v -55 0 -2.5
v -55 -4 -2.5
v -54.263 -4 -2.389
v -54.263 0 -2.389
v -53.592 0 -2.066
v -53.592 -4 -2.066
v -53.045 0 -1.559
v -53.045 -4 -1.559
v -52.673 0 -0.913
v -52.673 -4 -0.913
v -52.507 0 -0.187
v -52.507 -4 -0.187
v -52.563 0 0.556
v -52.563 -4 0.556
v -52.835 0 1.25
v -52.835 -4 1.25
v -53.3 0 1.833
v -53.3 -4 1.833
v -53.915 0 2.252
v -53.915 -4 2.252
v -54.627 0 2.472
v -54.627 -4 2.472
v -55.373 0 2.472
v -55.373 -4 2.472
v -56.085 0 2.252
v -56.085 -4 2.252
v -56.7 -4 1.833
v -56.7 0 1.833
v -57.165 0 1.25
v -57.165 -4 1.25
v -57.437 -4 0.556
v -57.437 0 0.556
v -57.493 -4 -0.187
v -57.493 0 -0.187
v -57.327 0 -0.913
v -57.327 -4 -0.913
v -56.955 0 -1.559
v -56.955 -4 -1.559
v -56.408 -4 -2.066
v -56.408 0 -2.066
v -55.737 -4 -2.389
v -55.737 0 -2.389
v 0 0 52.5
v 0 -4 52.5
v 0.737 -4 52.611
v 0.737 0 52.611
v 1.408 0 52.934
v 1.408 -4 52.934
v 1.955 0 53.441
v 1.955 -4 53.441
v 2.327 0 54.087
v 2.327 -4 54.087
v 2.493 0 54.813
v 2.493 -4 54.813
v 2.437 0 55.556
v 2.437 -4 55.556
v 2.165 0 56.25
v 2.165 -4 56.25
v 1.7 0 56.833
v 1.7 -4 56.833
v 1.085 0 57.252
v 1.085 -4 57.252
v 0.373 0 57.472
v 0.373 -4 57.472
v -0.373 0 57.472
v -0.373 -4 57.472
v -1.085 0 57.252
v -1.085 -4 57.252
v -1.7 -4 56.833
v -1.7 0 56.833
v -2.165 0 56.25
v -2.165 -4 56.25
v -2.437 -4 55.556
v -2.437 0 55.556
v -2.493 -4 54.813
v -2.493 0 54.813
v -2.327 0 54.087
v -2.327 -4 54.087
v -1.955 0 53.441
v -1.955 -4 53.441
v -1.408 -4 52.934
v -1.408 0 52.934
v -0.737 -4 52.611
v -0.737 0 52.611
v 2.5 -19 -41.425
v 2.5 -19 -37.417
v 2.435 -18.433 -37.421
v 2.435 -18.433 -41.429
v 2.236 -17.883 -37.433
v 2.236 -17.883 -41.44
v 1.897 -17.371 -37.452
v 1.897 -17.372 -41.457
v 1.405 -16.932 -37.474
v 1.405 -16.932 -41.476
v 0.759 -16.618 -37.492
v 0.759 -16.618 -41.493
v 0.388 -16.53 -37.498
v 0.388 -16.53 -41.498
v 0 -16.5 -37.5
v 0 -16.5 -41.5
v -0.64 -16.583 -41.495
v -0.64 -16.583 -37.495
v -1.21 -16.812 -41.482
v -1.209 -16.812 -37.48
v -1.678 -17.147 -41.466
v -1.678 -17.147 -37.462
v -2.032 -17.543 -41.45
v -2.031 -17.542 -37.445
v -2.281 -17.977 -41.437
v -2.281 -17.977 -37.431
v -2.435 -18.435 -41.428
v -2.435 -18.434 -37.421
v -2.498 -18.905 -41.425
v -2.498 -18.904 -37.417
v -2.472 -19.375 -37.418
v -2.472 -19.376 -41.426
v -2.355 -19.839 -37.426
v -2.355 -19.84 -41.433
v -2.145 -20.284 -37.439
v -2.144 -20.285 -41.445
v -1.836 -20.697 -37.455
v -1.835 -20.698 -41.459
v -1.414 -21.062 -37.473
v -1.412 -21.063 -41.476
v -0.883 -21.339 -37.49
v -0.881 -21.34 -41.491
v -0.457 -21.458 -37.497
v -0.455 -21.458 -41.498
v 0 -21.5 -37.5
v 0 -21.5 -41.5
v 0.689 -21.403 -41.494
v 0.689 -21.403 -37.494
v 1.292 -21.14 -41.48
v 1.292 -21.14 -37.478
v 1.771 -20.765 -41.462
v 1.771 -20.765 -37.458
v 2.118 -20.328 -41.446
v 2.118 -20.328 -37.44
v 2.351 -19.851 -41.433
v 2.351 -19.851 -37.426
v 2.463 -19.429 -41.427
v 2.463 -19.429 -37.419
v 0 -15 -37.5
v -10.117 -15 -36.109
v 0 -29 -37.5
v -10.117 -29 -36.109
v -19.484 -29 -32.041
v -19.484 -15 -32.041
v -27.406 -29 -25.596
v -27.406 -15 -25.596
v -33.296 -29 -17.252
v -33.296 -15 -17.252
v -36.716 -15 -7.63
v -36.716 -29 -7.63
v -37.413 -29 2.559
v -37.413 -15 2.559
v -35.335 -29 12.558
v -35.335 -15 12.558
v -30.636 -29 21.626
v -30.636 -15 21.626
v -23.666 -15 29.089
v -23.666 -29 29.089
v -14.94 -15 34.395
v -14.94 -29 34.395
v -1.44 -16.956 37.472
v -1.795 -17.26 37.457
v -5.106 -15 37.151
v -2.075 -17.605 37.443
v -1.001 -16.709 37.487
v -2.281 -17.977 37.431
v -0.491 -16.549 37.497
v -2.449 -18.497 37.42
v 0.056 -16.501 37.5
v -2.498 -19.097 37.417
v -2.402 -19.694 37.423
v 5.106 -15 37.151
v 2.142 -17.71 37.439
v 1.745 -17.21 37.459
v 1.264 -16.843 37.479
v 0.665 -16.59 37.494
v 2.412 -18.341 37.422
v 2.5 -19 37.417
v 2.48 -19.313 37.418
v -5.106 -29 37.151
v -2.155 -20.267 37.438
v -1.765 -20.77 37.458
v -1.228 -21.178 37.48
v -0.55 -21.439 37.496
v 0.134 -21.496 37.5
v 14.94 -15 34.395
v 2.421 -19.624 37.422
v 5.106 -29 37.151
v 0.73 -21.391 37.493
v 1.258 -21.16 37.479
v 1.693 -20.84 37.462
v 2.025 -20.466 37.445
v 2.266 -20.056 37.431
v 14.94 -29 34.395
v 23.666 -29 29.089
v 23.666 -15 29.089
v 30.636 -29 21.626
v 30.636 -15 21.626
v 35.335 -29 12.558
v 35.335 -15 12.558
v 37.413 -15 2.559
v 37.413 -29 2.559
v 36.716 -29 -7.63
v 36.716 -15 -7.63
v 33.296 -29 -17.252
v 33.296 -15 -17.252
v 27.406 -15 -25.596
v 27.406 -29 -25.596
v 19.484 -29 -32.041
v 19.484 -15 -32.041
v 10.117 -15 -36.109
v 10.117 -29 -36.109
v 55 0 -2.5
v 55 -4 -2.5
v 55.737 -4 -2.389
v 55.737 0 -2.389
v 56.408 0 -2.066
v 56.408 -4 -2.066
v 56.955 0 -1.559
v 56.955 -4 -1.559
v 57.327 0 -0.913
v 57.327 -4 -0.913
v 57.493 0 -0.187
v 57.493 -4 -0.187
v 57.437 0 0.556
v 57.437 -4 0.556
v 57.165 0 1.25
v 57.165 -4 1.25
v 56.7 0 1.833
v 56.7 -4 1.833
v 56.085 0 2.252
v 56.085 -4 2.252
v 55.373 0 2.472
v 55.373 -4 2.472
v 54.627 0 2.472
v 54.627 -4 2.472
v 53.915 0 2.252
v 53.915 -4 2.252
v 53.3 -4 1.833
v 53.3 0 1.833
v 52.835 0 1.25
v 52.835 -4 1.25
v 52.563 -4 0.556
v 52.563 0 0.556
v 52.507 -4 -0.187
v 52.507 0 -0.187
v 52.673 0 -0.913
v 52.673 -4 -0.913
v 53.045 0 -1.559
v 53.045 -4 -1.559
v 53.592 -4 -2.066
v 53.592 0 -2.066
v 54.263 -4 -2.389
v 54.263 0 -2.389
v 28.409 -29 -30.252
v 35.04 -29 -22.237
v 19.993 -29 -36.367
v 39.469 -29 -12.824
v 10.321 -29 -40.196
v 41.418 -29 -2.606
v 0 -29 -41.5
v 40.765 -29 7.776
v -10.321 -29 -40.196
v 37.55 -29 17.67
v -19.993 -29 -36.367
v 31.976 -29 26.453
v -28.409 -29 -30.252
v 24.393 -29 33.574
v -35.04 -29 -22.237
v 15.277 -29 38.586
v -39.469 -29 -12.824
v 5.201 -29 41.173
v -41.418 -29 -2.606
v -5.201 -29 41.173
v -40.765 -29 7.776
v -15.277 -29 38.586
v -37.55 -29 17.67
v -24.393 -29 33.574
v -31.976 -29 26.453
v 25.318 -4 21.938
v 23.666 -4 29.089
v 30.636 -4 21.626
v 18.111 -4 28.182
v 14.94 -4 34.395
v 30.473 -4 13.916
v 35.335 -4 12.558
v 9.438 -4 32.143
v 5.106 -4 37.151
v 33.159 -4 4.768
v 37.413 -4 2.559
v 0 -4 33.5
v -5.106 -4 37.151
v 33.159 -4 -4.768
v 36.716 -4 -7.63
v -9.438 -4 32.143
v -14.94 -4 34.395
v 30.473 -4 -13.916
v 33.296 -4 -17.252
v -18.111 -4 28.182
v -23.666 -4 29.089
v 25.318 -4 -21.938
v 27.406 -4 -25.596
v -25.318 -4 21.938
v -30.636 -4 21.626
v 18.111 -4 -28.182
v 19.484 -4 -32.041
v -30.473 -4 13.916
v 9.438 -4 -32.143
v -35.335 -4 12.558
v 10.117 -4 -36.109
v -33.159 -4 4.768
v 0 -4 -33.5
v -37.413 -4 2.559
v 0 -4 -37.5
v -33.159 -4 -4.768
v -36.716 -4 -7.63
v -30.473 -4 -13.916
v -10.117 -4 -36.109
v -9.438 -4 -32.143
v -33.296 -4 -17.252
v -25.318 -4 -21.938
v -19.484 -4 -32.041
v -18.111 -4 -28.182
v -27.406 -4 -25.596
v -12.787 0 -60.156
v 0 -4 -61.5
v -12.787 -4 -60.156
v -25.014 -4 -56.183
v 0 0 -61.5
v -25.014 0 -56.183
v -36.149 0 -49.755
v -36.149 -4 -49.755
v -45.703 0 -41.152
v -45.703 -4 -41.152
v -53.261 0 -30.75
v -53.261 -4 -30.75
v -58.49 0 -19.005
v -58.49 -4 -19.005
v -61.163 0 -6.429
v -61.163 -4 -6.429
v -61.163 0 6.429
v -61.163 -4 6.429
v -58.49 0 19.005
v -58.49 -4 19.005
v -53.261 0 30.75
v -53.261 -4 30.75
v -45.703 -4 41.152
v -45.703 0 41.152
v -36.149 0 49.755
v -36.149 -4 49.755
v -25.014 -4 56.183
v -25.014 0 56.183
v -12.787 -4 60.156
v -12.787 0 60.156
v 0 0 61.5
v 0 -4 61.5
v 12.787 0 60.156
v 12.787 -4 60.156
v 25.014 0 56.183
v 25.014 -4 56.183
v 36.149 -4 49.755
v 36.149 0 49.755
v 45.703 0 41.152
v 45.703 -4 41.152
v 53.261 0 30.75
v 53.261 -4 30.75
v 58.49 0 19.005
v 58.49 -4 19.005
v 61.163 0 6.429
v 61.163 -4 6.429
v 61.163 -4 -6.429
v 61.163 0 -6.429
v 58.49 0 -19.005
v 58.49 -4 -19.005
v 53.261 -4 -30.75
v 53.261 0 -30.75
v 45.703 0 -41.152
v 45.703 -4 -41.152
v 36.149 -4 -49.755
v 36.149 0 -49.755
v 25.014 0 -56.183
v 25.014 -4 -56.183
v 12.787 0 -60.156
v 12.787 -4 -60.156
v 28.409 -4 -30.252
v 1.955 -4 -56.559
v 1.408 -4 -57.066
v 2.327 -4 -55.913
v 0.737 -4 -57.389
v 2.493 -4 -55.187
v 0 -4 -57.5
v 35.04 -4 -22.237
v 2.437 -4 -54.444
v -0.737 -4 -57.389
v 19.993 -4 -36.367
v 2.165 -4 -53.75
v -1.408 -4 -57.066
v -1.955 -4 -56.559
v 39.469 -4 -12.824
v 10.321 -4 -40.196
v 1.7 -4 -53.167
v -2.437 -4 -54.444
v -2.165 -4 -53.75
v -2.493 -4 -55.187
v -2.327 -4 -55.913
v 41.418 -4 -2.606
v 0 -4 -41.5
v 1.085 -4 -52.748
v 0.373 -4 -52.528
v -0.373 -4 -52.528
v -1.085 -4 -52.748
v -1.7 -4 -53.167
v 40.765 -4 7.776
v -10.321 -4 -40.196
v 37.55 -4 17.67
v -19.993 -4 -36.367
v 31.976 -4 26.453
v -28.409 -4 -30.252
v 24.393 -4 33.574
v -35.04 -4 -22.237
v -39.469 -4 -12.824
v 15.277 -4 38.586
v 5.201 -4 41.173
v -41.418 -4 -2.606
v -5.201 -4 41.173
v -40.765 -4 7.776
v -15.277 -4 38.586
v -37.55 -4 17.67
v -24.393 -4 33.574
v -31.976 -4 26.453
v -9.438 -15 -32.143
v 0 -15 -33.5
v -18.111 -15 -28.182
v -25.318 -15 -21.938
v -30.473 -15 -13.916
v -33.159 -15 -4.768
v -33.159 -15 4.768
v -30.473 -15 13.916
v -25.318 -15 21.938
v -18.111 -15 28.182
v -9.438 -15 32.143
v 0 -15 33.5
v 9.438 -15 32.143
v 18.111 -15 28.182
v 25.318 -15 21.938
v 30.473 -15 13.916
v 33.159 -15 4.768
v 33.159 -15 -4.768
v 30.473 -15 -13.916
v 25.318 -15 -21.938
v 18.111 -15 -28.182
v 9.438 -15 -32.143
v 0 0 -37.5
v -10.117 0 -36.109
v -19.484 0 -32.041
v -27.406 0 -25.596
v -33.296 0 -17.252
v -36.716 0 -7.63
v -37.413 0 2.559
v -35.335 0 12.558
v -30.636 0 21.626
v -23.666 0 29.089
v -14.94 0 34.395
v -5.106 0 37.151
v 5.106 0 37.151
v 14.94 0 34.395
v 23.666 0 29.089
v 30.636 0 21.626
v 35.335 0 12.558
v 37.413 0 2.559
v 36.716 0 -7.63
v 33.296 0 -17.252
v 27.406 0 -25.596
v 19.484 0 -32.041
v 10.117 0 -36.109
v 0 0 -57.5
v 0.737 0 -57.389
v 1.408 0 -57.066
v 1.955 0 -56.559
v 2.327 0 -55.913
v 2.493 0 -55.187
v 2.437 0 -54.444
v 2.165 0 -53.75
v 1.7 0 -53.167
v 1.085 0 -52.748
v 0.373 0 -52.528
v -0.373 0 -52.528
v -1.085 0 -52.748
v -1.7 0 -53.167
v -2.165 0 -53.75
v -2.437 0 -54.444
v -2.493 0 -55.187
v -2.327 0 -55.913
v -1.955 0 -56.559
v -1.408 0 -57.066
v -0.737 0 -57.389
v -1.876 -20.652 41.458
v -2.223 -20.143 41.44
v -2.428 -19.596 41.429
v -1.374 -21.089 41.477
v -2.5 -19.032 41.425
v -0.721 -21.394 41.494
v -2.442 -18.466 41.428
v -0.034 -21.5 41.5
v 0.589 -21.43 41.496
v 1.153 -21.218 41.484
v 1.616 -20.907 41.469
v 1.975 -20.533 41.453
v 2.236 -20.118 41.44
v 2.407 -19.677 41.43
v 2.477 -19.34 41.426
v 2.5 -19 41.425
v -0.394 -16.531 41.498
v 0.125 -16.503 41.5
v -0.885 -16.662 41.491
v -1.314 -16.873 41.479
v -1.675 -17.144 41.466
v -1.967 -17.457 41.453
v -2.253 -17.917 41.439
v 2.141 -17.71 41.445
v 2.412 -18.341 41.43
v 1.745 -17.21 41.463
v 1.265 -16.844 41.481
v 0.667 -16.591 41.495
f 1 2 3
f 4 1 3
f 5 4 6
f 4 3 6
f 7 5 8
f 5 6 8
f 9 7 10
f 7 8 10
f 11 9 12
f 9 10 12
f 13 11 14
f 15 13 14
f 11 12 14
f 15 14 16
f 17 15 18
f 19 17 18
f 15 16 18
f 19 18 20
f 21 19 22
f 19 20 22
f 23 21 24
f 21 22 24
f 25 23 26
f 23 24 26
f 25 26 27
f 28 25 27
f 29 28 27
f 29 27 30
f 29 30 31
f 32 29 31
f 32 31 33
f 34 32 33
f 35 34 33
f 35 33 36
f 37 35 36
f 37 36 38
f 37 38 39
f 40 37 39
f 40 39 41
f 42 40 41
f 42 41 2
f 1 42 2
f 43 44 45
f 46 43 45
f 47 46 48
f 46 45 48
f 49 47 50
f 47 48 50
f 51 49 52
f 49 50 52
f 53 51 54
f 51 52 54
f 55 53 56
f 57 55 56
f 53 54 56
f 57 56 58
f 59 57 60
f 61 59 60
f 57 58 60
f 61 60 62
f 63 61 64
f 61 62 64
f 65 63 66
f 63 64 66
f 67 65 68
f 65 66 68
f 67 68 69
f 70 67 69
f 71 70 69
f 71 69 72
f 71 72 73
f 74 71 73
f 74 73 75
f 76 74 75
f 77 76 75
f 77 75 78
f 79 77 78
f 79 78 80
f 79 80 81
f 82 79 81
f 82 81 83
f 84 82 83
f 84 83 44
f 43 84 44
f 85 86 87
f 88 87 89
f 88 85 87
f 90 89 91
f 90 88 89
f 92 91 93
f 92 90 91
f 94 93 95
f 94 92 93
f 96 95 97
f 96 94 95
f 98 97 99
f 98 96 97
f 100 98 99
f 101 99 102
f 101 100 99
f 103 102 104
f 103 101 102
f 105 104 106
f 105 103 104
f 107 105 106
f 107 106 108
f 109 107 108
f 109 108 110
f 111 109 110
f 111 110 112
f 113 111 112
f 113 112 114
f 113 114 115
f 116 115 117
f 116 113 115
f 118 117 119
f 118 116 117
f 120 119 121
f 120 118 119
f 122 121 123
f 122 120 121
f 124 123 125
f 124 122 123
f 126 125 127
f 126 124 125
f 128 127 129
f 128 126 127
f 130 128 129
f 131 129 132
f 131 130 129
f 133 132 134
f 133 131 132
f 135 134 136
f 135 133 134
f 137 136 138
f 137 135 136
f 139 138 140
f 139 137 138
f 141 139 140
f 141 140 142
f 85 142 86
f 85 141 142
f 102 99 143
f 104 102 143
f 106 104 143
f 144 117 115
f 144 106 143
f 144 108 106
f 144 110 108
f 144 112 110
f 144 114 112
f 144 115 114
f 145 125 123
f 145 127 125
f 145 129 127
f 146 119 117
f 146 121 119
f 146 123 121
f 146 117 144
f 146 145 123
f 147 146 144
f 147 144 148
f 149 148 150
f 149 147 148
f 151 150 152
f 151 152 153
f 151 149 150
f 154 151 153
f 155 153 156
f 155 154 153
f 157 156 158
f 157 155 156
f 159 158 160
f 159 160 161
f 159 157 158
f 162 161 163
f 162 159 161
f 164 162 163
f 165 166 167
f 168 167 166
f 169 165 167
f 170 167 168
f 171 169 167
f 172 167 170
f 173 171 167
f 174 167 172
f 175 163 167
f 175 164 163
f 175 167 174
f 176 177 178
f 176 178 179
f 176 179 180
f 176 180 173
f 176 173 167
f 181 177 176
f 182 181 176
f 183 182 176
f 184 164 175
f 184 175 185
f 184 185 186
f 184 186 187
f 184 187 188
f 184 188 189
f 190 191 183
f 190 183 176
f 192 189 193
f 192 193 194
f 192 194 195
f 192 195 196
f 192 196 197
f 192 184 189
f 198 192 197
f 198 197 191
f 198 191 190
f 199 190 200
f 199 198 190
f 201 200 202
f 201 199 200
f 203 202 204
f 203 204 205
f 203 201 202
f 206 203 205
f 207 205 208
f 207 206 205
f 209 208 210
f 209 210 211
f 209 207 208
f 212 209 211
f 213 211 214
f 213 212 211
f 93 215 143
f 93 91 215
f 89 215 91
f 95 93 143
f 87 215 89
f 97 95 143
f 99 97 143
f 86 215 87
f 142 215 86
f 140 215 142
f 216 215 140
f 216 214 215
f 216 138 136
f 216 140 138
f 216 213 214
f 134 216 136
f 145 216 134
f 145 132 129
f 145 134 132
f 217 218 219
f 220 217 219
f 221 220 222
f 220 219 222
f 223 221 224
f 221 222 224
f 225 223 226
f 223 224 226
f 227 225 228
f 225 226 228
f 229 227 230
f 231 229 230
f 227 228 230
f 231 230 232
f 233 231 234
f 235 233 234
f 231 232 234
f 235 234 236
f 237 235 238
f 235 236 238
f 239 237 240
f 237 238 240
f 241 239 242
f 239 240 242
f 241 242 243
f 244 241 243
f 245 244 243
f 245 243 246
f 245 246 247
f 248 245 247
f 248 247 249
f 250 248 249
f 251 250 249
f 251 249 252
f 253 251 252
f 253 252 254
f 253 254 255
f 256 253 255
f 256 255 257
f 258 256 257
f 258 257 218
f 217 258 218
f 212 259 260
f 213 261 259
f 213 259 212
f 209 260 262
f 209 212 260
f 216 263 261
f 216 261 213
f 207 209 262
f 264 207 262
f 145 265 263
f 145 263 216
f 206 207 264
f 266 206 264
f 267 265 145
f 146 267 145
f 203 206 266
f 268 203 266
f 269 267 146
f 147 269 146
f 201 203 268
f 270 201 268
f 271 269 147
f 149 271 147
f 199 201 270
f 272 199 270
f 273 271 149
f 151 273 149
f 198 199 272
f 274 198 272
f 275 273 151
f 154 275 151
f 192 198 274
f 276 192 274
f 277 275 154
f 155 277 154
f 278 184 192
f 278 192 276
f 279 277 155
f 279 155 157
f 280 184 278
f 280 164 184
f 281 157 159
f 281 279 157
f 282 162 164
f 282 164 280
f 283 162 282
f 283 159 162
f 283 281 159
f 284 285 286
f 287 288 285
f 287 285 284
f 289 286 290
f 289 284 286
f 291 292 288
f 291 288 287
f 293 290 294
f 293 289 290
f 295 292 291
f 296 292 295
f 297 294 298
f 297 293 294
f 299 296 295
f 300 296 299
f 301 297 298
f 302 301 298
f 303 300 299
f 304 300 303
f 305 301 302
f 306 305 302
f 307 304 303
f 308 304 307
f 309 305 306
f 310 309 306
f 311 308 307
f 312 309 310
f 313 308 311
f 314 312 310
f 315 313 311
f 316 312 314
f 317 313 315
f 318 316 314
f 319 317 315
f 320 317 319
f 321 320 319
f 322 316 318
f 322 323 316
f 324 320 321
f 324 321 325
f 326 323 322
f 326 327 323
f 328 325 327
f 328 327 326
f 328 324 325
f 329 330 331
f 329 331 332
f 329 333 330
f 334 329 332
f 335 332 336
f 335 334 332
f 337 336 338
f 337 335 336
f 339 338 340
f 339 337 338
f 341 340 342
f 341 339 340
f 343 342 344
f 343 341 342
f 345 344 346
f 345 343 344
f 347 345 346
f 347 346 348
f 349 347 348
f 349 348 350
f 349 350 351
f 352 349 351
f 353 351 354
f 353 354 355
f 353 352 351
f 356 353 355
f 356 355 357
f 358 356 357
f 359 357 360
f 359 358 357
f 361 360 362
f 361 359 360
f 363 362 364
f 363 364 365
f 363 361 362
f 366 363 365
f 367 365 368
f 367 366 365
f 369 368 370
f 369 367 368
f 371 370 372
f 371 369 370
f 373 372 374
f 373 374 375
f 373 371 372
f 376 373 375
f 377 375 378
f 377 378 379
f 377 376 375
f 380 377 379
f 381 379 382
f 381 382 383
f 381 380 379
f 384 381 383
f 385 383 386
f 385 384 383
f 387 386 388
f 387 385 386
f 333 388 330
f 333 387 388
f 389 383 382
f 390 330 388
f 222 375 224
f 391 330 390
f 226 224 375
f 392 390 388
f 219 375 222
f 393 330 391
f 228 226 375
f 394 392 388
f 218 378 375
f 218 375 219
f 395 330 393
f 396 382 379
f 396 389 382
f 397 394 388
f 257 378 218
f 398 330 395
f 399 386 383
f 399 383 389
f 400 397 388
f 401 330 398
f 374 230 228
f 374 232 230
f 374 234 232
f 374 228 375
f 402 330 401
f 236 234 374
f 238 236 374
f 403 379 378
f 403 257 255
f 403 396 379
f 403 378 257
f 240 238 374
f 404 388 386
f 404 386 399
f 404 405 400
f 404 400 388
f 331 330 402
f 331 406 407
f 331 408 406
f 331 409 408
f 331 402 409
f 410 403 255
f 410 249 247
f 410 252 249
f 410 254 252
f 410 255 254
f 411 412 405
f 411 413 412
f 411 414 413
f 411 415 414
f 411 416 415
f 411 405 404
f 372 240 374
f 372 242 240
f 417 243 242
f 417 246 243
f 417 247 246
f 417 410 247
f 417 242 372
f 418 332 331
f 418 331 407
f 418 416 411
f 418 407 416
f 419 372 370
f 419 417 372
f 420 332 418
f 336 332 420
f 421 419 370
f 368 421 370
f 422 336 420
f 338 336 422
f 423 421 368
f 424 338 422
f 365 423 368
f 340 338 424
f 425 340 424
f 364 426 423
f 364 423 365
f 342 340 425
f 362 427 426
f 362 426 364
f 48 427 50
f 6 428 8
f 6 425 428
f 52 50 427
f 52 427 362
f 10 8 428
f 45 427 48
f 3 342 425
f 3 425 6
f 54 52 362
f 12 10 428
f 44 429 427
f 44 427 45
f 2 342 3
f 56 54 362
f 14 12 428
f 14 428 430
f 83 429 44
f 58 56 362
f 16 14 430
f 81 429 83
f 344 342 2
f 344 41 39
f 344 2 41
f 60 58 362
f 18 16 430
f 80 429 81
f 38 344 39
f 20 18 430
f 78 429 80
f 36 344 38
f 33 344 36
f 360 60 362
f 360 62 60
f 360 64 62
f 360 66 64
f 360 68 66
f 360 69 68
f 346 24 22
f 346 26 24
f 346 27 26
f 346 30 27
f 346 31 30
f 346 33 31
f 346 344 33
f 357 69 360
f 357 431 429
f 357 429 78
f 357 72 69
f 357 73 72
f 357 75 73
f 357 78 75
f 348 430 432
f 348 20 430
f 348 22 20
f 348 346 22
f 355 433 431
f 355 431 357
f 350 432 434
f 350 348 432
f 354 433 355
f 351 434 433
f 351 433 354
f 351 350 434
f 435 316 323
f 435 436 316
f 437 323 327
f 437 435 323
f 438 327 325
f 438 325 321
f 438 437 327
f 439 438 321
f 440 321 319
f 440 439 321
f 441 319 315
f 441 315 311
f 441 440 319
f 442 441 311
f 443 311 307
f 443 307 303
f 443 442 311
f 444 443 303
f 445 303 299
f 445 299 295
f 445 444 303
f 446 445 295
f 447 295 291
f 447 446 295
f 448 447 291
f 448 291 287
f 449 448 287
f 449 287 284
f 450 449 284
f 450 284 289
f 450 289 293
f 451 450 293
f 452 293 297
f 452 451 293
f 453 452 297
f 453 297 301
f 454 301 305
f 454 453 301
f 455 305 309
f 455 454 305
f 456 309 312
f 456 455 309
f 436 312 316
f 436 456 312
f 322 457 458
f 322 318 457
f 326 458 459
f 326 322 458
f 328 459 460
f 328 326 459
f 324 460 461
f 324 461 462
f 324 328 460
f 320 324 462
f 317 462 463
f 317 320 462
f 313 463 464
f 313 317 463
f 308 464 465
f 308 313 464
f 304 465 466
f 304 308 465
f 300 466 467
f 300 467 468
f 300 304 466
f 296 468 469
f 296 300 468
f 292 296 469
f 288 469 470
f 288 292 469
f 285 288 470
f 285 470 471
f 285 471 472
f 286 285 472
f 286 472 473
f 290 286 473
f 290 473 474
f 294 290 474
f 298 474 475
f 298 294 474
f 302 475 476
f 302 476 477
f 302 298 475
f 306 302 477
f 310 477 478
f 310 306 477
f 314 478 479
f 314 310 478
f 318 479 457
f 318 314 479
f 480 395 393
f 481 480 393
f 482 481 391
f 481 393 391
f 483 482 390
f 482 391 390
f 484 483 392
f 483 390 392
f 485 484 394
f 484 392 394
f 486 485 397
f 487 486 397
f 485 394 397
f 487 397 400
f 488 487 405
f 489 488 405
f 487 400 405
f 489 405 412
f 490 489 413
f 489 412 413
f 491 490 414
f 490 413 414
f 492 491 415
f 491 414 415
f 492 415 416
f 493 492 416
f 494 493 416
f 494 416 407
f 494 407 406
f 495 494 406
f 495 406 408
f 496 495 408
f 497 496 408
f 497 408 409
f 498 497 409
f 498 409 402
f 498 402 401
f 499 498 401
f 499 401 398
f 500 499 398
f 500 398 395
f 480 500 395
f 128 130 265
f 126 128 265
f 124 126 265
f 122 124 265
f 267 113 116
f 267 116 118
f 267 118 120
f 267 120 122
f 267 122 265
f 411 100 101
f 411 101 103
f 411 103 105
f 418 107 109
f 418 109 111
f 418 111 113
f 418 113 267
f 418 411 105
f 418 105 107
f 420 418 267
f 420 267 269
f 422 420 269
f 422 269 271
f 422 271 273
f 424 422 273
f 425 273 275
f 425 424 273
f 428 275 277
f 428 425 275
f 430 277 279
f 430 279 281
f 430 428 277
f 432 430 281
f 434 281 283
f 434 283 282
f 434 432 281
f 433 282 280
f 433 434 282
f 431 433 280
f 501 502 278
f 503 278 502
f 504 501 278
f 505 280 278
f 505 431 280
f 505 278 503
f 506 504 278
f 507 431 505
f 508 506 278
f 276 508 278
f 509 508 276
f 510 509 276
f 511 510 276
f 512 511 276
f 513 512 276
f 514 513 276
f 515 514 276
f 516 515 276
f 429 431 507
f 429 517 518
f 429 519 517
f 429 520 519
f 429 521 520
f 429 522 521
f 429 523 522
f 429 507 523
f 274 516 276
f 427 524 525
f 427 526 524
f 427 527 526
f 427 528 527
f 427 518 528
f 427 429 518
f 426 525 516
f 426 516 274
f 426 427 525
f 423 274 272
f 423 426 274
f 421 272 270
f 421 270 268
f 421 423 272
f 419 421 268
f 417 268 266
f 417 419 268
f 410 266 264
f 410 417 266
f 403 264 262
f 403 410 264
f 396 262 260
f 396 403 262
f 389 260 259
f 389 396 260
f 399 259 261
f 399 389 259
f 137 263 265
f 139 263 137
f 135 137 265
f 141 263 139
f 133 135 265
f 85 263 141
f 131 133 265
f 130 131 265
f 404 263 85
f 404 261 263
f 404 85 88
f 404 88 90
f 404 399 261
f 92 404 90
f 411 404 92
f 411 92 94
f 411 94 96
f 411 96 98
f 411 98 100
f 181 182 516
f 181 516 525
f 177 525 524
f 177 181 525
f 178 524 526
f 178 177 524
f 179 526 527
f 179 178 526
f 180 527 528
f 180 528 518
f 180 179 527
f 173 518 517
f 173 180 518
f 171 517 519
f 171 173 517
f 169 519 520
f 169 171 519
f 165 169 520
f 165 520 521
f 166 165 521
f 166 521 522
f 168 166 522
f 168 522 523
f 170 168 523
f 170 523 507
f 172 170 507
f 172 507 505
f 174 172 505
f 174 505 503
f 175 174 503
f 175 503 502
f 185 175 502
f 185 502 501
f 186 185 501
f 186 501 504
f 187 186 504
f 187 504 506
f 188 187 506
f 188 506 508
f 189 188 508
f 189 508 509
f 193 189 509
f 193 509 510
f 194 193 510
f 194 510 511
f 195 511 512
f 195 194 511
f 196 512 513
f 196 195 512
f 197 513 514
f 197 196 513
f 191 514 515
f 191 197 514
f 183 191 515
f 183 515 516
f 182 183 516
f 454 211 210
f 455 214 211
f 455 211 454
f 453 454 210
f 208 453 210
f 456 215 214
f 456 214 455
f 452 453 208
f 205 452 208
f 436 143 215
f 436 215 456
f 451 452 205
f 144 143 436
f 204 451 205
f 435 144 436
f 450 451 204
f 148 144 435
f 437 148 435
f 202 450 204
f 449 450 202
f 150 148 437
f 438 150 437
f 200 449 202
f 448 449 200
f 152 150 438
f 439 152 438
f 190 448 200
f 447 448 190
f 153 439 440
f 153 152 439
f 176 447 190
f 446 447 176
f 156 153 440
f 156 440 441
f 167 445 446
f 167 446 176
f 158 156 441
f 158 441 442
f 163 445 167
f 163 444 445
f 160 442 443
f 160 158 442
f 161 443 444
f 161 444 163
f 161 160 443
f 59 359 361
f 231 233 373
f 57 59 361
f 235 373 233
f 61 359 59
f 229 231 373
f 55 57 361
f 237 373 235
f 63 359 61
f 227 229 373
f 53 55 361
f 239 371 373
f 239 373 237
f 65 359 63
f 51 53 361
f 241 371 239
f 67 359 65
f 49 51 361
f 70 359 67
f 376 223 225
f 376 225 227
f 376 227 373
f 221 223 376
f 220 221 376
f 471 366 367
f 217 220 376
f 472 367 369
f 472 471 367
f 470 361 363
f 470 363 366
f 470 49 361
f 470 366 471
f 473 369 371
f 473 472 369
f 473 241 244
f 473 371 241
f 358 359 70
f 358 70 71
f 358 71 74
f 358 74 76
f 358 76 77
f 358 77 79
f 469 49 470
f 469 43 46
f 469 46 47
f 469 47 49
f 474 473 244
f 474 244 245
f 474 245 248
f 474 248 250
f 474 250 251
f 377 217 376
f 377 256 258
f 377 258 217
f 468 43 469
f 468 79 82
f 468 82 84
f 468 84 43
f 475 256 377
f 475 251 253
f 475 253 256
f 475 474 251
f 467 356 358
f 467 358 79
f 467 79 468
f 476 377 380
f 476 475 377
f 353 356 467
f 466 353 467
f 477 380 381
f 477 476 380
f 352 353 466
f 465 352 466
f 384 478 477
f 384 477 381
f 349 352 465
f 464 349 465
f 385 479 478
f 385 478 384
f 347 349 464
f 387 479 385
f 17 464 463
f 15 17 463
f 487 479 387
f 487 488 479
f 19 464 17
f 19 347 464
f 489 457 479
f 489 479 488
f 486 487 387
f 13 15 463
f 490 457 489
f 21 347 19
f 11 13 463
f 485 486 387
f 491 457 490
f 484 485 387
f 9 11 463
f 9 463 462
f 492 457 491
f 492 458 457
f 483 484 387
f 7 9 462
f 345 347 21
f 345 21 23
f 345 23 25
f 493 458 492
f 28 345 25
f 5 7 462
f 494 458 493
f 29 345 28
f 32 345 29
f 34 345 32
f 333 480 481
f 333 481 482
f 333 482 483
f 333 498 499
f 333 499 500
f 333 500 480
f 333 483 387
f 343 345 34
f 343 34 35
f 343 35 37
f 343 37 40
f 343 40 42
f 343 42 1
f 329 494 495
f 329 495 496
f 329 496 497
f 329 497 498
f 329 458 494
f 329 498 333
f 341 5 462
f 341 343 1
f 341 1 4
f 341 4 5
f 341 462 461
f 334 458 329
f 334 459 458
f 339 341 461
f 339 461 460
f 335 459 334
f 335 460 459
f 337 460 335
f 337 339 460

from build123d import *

# Parameters (mm, degrees)
SKETCH2_R               = 2.5
CUT_EXTRUDE3_DEPTH      = 91.495856259
CUT_EXTRUDE6_DEPTH      = 92.681513949
CUT_EXTRUDE6_DEPTH_BACK = 92.681513949
SKETCH6_R               = 2.5


with BuildPart() as part:
    # Sketch1 → Revolve1 (revolve)
    with BuildSketch(Plane.XY, mode=Mode.PRIVATE) as revolve1_sk:
        Polygon((-41.5, -29), (-41.5, -4), (-61.5, -4), (-61.5, 0), (-37.5, 0), (-37.5, -4), (-33.5, -4), (-33.5, -15), (-37.5, -15), (-37.5, -29), align=None)
    revolve(revolve1_sk.sketch.rotate(Axis((0, -100.5, 0), (0, 1, 0)), 270), axis=Axis((0, -100.5, 0), (0, 1, 0)))

    # Sketch2 → Cut-Extrude3 (cut, through all)
    with BuildSketch(Plane.XZ.offset(4)):
        with Locations(Location((55, 0, 0), (0, 0, 270))):
            Circle(SKETCH2_R)
        with Locations(Location((-55, 0, 0), (0, 0, 270))):
            Circle(SKETCH2_R)
        with Locations(Location((0, 55, 0), (0, 0, 270))):
            Circle(SKETCH2_R)
        with Locations(Location((0, -55, 0), (0, 0, 270))):
            Circle(SKETCH2_R)
    extrude(amount=-CUT_EXTRUDE3_DEPTH, mode=Mode.SUBTRACT)

    # Sketch6 → Cut-Extrude6 (cut, two sides: drawn at the far end of the back side and taken through both)
    with BuildSketch(Plane.XY.offset(-CUT_EXTRUDE6_DEPTH_BACK)):
        with Locations((0, -19)):
            Circle(SKETCH6_R)
    extrude(amount=CUT_EXTRUDE6_DEPTH + CUT_EXTRUDE6_DEPTH_BACK, mode=Mode.SUBTRACT)


solid = part.part
